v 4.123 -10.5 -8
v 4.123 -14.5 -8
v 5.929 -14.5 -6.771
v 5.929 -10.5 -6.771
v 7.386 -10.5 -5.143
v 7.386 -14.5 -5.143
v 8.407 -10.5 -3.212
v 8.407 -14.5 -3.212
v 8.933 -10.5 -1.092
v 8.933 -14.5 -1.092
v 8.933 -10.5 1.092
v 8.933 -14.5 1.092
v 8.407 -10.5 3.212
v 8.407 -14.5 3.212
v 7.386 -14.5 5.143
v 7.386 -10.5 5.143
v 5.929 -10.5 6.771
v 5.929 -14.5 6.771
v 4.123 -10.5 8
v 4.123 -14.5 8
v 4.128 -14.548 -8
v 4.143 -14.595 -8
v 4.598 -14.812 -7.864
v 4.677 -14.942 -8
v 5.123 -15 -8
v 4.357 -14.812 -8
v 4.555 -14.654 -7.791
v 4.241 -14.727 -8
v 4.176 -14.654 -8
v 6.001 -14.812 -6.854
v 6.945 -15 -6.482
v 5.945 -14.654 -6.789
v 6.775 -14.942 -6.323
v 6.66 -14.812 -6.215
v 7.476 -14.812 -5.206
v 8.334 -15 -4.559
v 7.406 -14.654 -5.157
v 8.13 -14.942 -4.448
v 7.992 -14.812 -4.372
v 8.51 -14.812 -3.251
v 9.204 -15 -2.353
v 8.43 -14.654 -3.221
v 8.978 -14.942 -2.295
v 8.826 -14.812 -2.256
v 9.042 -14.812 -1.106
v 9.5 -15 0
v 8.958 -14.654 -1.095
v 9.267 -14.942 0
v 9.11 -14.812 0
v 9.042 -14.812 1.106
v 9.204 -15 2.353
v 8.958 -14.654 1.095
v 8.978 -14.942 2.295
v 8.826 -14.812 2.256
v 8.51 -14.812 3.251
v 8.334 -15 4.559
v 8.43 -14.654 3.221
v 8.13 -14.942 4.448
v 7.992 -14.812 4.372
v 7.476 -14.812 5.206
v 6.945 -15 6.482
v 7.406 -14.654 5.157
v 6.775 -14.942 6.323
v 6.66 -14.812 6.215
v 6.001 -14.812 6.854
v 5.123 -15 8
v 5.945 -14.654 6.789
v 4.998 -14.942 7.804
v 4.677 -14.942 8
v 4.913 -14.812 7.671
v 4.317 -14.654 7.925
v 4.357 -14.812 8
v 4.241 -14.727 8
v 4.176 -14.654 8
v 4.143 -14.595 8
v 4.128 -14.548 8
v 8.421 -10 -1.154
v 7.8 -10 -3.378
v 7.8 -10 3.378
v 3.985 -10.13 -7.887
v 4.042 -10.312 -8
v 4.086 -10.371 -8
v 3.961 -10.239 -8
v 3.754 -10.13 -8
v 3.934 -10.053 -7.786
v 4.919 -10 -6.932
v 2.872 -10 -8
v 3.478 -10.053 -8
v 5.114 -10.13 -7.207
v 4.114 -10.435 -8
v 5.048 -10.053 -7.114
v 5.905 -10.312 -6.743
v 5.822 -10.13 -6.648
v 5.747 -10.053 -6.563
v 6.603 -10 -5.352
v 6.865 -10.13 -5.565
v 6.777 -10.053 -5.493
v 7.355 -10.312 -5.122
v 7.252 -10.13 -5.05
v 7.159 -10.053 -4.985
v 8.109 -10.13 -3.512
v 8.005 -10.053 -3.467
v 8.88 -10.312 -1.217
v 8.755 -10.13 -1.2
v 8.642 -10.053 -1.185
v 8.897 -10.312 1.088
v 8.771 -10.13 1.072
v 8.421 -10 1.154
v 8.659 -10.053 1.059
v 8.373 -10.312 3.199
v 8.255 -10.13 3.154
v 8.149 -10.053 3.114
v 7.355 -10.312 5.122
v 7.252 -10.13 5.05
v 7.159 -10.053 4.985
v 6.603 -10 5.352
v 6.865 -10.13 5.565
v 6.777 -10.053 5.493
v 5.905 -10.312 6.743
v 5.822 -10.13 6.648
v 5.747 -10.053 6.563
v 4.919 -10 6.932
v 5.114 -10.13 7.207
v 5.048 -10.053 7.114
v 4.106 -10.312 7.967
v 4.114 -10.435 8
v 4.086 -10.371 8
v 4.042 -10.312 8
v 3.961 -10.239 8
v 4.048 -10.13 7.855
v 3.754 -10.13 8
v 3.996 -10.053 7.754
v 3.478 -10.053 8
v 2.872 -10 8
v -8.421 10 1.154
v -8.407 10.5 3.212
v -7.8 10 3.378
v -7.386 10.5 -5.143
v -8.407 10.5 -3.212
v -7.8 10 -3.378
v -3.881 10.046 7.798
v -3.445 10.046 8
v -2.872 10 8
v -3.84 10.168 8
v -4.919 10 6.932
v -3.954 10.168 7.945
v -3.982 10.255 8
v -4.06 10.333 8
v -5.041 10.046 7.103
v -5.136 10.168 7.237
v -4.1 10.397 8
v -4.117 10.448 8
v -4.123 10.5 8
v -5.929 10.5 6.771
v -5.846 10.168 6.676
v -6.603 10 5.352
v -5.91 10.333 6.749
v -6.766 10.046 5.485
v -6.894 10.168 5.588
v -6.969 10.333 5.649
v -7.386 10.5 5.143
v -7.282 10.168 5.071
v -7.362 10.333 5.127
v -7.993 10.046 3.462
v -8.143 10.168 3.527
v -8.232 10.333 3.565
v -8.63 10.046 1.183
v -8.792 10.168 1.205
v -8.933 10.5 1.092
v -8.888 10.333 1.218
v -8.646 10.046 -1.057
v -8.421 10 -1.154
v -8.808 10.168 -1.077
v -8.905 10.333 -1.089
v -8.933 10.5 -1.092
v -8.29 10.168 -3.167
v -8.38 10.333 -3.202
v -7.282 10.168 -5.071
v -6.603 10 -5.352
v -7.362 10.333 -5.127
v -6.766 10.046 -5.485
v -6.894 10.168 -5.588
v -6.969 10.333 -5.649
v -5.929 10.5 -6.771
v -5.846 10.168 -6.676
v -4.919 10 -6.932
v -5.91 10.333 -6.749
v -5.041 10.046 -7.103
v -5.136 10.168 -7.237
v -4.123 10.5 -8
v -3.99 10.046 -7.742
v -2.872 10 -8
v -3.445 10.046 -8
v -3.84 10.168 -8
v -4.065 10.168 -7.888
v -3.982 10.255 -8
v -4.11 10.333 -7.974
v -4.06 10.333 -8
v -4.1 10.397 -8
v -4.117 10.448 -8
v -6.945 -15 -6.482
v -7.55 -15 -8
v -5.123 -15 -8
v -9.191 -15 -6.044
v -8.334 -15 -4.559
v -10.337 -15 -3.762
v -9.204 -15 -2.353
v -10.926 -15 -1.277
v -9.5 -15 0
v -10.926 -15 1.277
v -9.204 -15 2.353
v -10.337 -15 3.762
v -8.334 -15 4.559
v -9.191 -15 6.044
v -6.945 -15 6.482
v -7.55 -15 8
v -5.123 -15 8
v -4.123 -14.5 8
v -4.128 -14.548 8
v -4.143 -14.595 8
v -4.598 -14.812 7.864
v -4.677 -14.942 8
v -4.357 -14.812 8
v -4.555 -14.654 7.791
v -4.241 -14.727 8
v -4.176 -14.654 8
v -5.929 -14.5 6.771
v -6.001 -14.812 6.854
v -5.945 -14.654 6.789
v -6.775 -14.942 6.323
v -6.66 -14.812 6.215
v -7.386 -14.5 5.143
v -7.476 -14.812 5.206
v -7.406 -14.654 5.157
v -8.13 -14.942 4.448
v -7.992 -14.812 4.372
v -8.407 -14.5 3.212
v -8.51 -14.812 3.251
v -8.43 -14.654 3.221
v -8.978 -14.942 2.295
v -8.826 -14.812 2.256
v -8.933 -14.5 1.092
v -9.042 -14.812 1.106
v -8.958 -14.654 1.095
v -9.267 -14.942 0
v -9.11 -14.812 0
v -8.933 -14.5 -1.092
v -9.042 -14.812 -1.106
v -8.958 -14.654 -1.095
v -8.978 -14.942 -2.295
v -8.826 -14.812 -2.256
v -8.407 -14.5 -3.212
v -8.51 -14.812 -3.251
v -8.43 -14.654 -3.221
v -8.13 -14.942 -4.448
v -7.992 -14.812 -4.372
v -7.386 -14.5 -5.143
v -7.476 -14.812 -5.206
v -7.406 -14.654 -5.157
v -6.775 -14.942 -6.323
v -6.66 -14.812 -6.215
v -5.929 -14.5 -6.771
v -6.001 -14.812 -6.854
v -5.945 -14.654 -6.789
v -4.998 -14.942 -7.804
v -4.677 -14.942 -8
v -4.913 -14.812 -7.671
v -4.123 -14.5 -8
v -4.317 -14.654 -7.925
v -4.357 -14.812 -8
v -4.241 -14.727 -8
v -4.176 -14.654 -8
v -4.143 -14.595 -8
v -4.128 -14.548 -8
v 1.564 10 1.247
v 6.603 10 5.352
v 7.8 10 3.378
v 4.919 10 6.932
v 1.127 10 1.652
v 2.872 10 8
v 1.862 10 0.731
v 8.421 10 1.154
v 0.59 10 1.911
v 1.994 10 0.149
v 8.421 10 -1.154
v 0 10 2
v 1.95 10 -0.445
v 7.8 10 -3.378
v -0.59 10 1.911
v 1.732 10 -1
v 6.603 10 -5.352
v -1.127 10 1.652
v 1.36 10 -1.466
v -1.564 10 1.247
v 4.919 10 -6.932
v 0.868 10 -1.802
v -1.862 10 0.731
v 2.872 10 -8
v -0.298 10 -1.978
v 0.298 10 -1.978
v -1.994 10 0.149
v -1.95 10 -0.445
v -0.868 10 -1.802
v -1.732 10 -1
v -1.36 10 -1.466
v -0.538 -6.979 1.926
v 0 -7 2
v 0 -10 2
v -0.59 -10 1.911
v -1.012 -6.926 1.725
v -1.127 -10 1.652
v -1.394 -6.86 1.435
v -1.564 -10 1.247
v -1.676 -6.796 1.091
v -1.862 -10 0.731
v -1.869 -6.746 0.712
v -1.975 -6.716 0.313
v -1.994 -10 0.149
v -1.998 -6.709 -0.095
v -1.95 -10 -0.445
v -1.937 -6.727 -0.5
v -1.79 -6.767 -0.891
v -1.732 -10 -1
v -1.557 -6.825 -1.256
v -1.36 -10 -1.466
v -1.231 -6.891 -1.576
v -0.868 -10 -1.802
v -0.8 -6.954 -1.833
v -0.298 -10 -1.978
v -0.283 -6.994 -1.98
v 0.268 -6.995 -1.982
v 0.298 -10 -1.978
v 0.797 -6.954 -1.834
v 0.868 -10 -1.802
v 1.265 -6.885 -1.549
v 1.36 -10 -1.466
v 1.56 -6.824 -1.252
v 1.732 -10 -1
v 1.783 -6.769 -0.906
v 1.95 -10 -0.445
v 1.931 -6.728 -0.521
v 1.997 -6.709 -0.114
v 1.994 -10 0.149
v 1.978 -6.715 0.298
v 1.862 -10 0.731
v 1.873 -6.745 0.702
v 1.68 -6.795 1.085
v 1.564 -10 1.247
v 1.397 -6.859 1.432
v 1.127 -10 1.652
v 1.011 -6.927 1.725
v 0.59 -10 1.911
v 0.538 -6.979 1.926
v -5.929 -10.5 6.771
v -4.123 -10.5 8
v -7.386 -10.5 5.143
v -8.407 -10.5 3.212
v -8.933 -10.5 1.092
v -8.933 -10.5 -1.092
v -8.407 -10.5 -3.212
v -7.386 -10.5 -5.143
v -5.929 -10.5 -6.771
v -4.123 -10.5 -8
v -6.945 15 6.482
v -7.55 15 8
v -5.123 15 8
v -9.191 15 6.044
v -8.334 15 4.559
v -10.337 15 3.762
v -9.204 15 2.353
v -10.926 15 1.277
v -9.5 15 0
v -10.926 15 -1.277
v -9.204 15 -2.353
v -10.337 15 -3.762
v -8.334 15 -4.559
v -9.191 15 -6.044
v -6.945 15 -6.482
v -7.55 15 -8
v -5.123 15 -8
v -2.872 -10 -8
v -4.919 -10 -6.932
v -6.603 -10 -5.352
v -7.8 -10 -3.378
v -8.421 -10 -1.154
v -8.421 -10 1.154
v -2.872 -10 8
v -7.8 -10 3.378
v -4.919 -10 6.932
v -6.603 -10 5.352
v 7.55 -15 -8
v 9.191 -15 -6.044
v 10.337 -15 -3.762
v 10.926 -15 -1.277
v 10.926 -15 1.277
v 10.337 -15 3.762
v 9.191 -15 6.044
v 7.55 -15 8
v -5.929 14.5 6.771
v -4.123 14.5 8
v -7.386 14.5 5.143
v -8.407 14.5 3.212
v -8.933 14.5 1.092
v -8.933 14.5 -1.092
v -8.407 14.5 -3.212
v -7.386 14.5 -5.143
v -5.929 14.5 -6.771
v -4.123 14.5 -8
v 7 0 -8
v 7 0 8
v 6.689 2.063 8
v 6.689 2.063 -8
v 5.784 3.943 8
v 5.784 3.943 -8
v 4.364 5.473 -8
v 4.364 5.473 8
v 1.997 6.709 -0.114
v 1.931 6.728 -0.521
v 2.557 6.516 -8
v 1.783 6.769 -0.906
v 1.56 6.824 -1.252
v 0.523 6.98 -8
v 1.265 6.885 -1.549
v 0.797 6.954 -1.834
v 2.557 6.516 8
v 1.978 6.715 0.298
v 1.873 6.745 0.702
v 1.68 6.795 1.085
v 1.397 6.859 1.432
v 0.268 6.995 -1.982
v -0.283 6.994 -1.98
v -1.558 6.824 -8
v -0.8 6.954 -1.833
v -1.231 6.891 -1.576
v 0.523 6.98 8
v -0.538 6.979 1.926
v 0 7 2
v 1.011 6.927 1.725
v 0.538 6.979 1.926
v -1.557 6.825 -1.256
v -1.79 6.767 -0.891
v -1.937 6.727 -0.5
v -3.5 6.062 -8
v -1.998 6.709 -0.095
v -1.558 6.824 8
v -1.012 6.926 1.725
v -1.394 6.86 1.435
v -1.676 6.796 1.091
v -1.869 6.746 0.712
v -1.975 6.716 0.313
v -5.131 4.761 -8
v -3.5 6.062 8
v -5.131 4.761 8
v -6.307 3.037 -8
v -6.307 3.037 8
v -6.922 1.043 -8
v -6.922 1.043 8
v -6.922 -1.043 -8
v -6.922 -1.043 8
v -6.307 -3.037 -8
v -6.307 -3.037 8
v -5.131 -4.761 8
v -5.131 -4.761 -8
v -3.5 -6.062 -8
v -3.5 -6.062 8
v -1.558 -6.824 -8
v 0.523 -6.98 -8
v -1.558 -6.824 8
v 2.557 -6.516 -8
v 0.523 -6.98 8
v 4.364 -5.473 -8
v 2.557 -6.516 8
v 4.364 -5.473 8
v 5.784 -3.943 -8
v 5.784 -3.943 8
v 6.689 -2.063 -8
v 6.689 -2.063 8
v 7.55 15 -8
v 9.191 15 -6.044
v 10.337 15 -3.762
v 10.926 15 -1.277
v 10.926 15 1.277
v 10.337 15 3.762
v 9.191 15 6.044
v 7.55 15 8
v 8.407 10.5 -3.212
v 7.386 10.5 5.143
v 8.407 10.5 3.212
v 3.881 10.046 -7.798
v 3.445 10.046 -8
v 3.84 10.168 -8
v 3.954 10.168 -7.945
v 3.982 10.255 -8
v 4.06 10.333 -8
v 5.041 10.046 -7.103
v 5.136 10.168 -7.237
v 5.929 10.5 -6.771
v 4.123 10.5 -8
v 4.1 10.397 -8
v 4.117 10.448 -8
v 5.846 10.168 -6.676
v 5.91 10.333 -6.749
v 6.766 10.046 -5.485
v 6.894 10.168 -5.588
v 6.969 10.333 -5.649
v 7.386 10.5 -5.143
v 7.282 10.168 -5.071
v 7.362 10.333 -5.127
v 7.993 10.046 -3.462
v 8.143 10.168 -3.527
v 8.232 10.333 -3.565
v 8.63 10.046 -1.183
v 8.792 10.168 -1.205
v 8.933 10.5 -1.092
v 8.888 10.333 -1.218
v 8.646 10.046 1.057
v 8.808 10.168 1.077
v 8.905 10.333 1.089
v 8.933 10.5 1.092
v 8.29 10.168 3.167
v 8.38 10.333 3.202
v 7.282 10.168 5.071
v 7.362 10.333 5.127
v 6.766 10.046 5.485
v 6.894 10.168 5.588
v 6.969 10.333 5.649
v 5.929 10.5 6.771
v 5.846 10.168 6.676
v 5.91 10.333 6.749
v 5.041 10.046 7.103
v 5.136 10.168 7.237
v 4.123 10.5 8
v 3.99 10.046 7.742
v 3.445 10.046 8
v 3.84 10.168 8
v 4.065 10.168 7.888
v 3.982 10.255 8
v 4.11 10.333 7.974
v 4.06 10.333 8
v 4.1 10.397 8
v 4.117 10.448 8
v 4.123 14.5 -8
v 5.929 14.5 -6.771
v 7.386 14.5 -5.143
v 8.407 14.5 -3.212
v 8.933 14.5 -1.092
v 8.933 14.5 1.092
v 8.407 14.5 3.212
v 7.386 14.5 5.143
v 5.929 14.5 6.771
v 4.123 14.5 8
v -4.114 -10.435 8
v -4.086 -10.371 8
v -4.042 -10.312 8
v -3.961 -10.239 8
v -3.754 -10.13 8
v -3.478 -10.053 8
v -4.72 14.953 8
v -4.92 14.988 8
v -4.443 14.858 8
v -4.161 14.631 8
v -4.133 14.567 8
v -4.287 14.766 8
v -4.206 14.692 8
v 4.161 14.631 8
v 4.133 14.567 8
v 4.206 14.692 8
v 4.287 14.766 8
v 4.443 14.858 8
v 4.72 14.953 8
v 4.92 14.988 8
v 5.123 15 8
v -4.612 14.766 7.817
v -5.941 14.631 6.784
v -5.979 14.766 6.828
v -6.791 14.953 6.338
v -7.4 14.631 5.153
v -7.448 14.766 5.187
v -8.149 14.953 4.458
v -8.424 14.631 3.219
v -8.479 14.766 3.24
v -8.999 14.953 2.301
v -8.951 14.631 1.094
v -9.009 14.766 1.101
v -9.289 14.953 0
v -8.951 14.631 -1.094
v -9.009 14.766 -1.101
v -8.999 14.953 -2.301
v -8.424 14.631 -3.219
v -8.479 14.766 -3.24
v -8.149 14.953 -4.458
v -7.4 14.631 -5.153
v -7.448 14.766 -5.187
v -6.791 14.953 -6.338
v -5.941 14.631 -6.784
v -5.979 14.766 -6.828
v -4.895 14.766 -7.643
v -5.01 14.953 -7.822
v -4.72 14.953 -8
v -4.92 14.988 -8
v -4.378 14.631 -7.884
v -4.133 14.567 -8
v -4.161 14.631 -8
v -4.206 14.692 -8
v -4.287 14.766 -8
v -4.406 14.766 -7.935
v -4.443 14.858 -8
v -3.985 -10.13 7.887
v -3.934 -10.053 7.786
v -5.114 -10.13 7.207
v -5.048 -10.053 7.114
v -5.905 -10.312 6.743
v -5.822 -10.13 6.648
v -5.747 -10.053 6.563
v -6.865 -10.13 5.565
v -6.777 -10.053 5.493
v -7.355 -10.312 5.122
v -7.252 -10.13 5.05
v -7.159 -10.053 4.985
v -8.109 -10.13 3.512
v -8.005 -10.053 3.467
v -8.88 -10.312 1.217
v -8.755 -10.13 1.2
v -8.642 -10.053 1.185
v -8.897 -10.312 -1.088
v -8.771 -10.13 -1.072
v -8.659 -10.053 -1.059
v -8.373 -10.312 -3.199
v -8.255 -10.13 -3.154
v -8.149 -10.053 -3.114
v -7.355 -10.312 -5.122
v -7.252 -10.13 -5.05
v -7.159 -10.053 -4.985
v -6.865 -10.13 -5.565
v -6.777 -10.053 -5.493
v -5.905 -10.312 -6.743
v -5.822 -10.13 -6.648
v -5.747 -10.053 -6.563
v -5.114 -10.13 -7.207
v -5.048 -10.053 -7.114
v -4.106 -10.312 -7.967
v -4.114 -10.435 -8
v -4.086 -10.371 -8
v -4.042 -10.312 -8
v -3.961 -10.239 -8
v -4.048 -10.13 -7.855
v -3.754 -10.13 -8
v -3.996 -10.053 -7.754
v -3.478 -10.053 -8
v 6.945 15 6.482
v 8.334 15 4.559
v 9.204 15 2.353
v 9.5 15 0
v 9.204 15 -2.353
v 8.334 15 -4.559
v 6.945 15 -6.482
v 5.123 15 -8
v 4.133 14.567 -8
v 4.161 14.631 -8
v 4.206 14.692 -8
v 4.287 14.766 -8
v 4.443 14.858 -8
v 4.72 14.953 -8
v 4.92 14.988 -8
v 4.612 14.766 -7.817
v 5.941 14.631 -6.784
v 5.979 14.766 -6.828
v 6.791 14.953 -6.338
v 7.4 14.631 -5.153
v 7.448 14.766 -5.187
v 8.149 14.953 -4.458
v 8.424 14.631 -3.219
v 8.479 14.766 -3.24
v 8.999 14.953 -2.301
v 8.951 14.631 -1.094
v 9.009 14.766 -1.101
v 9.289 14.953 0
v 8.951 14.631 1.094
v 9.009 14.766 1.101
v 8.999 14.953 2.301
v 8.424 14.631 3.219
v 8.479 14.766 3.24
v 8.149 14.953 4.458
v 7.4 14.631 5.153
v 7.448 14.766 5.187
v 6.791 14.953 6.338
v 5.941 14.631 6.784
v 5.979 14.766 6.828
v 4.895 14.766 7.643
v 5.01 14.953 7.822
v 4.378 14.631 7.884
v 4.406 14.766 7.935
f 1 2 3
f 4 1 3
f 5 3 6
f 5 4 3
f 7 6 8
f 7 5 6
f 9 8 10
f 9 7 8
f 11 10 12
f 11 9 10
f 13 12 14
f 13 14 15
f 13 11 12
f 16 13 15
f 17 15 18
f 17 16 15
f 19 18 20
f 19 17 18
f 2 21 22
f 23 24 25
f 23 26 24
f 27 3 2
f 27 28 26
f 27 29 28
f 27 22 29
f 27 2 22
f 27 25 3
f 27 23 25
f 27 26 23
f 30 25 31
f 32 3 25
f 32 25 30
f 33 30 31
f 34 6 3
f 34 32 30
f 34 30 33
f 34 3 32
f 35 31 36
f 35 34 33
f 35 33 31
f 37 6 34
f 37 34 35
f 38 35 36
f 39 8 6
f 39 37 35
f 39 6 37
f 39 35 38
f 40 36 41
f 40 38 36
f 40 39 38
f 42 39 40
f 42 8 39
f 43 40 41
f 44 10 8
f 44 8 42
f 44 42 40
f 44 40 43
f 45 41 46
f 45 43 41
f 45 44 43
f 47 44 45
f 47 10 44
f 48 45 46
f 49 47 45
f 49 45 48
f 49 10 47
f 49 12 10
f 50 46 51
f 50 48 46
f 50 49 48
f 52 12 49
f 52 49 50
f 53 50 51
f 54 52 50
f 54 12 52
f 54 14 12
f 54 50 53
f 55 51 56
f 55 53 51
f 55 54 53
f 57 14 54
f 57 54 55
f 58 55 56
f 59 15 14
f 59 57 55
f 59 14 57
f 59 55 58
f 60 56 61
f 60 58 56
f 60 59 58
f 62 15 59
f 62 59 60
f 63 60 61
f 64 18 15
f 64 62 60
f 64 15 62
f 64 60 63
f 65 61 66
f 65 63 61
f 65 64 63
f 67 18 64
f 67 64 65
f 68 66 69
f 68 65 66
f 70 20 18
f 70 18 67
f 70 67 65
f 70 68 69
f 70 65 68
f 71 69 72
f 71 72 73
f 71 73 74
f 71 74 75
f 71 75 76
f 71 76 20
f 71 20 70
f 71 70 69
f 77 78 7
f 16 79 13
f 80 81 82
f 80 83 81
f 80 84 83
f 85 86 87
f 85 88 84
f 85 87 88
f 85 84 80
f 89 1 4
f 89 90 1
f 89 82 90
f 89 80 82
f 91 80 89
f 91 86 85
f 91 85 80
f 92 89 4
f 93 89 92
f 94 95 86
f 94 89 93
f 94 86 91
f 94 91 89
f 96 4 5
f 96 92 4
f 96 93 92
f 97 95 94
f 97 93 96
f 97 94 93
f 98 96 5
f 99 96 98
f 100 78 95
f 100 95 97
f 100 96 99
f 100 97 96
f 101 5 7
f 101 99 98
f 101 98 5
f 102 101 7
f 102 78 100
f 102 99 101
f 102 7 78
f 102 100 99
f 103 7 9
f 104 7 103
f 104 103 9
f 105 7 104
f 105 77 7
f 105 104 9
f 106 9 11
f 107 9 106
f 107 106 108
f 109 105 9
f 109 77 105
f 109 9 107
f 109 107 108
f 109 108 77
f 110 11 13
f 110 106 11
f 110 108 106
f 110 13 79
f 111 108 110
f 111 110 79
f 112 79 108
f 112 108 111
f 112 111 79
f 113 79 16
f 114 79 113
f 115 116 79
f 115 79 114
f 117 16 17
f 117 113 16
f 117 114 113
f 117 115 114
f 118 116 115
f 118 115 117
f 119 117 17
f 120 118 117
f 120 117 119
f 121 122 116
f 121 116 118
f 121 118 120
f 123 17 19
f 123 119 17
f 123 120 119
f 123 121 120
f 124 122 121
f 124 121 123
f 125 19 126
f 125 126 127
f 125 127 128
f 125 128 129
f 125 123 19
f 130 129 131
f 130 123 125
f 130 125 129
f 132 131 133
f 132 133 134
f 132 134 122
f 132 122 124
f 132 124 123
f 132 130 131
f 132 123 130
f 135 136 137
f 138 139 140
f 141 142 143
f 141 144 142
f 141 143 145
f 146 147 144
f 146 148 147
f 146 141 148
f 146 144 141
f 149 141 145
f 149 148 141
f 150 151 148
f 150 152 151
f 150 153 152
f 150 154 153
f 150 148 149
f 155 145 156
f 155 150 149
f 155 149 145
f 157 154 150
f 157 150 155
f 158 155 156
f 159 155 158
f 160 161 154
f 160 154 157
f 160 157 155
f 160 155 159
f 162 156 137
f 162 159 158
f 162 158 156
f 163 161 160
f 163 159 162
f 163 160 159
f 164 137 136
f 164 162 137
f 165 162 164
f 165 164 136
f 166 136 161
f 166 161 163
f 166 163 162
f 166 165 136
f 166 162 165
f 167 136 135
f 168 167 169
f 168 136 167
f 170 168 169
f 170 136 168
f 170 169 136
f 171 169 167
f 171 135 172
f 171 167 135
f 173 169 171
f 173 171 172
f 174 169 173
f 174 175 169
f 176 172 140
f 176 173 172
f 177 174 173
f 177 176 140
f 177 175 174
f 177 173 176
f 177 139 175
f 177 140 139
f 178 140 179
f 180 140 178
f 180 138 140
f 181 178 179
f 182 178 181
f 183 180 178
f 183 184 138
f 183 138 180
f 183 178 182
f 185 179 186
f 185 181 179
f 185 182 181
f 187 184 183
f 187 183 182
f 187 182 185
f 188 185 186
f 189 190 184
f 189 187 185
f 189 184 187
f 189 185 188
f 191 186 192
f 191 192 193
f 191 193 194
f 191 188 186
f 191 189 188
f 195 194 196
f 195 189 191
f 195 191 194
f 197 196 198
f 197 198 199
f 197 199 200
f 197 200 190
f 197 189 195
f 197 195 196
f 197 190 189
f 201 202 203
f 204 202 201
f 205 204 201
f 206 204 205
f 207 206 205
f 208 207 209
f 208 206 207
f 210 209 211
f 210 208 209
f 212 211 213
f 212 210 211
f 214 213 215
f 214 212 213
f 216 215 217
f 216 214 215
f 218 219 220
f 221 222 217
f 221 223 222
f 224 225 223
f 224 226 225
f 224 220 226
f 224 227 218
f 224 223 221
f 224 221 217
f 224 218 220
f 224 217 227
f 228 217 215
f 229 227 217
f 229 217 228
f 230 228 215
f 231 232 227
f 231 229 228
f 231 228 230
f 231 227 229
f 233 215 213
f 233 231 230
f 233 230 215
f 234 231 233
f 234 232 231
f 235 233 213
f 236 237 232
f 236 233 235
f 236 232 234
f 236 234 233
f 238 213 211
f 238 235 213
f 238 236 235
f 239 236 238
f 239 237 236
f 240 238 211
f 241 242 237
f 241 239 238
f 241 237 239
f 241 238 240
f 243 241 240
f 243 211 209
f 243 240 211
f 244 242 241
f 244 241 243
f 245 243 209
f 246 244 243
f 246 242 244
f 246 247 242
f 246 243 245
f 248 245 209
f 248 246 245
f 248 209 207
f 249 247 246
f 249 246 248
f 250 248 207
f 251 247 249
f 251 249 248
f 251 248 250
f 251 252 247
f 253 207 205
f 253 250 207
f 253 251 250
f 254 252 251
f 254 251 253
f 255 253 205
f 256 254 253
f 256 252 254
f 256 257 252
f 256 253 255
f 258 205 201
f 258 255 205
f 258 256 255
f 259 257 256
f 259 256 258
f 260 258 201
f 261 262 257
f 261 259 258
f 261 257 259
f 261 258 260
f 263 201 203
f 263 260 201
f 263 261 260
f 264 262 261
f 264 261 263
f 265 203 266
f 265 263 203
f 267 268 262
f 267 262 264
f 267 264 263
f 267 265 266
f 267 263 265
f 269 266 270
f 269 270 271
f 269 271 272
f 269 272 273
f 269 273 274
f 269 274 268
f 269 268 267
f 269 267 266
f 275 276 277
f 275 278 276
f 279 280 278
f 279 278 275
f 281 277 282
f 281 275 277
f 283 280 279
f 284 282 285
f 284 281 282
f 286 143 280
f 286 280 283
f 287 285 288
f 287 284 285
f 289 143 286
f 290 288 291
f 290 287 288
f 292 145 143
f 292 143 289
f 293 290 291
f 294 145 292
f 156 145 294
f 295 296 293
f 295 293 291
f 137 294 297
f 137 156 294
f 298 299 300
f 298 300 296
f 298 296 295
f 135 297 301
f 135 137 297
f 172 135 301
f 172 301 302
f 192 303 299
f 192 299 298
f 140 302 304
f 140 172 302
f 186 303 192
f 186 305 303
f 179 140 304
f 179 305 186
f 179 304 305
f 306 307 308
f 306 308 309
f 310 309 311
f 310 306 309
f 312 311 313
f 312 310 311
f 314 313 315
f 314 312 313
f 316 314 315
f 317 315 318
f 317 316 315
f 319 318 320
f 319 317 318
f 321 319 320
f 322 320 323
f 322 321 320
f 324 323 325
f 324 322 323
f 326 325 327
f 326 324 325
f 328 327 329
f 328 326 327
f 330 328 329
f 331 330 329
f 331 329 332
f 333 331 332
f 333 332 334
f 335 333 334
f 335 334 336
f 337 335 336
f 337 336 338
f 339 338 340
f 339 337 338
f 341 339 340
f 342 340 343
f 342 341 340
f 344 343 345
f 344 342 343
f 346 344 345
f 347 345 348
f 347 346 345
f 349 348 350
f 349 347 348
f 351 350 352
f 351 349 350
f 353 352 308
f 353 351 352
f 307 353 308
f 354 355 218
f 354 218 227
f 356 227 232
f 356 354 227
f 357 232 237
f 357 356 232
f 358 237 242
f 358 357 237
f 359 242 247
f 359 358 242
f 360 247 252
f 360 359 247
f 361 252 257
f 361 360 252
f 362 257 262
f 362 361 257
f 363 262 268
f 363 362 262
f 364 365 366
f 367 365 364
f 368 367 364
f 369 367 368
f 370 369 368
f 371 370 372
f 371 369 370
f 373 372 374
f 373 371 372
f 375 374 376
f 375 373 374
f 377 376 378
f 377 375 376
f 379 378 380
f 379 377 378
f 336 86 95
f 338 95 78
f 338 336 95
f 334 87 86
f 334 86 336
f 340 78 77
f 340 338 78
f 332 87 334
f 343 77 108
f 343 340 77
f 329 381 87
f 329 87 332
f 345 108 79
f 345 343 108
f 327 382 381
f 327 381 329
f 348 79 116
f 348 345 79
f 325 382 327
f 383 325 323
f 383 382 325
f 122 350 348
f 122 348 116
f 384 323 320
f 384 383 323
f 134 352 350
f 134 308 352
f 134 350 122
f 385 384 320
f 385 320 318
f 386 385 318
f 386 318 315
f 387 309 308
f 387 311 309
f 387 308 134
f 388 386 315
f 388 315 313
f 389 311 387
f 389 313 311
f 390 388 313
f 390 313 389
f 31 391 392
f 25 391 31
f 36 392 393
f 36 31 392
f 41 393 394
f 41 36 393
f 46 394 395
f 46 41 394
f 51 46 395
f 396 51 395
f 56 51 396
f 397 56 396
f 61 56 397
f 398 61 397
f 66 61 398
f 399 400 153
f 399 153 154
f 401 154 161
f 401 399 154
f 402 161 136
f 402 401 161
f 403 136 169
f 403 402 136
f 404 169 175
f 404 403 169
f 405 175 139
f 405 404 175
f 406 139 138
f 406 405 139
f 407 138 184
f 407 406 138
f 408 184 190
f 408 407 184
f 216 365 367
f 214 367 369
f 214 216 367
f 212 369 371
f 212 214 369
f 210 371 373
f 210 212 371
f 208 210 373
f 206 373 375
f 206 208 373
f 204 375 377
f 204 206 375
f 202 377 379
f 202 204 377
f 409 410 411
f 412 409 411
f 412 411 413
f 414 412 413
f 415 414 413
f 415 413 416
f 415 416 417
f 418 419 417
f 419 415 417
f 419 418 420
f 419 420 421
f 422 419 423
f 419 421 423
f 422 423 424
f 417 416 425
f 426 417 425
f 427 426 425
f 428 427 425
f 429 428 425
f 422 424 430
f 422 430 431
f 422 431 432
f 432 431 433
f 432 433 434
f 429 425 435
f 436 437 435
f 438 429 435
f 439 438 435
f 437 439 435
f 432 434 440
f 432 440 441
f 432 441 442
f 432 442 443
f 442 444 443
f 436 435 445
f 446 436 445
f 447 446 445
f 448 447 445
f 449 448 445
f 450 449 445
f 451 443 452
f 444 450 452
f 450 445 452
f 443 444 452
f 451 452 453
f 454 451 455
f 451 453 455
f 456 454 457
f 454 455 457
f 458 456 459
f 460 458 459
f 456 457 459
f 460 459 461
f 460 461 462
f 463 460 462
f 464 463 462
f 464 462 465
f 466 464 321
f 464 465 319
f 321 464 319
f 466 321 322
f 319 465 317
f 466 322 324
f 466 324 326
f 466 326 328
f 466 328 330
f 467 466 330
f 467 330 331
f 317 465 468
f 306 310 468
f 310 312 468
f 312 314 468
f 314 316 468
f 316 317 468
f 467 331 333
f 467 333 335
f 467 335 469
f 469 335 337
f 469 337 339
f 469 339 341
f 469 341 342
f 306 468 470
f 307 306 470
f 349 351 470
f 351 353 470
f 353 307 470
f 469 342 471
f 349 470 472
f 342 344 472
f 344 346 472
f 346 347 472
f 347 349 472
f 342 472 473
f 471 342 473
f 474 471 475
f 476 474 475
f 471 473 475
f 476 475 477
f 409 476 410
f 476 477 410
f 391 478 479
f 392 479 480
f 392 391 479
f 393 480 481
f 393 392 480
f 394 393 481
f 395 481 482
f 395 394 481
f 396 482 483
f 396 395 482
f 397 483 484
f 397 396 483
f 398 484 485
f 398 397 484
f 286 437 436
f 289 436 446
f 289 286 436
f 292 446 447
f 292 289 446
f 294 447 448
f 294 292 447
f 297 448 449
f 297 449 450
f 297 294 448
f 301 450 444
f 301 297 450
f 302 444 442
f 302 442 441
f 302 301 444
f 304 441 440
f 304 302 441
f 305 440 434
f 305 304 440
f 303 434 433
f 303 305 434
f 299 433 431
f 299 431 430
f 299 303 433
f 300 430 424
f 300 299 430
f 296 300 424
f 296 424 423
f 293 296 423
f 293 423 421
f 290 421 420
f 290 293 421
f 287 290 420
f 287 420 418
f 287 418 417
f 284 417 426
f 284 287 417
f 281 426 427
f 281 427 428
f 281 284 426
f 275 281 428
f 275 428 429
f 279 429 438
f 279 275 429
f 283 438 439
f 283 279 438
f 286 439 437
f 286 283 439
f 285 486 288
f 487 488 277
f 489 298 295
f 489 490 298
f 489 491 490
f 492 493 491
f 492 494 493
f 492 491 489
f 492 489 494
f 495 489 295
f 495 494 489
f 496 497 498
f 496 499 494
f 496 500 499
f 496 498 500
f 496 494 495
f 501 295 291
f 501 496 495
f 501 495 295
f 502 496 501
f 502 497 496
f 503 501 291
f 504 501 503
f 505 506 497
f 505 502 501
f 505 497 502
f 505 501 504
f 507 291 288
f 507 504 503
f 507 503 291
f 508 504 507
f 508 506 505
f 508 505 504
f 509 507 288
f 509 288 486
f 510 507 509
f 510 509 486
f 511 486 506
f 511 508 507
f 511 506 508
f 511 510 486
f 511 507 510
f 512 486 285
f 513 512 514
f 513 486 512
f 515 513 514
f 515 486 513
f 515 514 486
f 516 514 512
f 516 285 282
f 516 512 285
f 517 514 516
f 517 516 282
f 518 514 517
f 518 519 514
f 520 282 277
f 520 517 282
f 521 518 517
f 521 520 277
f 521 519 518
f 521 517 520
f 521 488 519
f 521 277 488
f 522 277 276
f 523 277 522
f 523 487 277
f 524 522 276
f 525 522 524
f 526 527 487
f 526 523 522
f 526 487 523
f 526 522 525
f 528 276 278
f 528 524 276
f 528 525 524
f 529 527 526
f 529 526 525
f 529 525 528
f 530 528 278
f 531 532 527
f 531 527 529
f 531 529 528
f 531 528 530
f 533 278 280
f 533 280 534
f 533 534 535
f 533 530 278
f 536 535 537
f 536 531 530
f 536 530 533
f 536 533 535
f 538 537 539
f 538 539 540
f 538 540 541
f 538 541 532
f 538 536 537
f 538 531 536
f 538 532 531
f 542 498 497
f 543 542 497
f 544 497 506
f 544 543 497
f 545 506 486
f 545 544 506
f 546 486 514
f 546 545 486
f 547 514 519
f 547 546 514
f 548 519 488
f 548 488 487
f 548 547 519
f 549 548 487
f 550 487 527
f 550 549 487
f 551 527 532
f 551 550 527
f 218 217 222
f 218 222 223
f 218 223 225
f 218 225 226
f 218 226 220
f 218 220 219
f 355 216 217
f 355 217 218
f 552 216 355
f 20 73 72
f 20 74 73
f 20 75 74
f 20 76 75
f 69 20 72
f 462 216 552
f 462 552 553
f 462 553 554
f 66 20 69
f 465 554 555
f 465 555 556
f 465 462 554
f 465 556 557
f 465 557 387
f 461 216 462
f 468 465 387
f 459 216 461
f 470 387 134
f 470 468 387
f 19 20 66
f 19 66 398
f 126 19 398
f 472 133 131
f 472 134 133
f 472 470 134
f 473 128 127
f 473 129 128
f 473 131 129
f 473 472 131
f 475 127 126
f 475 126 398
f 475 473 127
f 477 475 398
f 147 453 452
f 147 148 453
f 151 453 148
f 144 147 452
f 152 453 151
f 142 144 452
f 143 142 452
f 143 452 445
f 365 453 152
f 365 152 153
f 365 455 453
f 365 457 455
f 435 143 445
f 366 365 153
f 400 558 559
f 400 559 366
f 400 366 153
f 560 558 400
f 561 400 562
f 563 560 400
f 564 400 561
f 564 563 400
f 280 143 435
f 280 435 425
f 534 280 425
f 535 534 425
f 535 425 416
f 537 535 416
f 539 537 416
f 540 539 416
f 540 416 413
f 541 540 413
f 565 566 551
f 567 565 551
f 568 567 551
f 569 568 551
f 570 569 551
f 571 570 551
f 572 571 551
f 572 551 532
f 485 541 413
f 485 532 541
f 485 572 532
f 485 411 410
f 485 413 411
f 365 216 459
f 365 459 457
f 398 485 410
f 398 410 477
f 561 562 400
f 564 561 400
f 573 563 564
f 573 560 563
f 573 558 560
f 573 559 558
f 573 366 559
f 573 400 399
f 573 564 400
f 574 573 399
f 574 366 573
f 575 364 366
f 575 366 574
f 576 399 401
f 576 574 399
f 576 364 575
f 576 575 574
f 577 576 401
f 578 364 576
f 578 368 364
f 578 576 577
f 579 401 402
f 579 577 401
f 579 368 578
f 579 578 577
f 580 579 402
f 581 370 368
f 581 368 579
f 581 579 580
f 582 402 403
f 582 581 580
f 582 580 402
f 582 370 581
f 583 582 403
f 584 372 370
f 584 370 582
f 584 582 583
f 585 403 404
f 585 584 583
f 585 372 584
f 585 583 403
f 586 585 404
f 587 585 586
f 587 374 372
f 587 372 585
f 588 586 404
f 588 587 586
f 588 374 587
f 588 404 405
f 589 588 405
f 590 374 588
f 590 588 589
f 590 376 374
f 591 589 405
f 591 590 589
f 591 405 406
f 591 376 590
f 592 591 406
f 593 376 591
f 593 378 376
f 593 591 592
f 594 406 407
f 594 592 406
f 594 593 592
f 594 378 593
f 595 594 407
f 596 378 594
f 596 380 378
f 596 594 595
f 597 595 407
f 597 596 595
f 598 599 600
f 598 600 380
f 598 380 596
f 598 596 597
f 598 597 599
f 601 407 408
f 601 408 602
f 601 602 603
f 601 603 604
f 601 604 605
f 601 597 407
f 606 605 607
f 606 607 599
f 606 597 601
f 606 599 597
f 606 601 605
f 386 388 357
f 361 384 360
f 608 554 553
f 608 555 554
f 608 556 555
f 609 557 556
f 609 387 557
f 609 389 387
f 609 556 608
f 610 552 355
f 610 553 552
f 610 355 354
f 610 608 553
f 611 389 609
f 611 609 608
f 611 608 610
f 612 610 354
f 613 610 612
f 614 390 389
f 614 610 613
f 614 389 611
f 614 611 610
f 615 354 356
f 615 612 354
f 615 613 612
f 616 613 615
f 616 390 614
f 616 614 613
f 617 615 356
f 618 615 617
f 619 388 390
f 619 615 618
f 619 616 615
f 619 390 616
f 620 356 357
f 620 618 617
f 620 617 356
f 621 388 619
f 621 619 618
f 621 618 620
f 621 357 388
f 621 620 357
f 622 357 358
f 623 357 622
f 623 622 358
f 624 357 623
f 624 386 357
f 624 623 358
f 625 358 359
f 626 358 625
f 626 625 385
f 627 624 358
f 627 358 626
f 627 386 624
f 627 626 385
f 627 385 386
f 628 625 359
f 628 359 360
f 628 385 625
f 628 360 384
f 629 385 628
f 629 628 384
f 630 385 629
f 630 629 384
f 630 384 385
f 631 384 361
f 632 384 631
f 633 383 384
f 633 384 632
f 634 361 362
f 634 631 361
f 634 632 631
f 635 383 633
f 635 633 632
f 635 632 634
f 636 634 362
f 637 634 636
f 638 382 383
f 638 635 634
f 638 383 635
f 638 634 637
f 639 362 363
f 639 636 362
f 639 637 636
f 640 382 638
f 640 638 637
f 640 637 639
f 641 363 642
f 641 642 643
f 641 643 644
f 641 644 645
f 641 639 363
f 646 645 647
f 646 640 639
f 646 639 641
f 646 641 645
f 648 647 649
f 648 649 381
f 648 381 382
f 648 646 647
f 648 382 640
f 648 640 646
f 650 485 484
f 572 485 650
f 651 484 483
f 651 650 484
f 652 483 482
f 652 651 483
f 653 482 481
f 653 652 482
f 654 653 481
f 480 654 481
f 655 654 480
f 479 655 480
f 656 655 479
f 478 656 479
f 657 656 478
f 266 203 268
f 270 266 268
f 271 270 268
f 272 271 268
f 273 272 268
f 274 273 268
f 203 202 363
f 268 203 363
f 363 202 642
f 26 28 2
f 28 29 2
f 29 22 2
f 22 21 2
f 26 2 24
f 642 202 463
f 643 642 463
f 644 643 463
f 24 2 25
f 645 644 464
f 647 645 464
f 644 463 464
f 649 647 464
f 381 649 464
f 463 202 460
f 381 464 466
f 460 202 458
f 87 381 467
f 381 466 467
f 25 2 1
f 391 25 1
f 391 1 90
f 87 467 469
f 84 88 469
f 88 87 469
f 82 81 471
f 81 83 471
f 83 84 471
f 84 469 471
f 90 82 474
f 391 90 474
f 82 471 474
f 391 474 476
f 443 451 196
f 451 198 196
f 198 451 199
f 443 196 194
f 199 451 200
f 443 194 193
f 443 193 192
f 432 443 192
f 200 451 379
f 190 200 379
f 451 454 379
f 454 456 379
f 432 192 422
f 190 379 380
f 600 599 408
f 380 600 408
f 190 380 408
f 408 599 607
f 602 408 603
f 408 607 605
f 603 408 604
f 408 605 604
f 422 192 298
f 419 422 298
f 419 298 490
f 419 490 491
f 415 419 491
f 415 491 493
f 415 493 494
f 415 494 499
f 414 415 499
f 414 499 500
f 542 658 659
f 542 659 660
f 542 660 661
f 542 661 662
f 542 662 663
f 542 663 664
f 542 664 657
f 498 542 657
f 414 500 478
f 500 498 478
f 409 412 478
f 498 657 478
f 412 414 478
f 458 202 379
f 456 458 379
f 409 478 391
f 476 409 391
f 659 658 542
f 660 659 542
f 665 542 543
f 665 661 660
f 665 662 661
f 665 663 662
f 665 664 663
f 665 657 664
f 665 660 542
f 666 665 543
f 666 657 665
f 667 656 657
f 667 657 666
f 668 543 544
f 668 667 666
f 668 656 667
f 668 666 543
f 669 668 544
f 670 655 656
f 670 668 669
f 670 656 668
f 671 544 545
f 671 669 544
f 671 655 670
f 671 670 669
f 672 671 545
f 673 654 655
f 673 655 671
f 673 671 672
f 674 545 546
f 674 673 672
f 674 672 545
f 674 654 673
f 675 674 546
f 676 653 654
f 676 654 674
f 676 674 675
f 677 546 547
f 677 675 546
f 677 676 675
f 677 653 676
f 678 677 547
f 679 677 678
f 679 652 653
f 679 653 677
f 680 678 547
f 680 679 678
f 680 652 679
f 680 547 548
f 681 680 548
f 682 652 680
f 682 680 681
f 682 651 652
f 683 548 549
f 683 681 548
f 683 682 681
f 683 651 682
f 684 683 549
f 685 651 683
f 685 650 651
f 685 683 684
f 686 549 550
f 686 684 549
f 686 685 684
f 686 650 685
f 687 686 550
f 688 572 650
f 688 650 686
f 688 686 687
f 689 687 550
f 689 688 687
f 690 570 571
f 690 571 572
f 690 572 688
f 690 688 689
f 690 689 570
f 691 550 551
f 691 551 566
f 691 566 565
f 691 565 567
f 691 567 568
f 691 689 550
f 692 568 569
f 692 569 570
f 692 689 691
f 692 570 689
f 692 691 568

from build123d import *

# Parameters (mm, degrees)
ESQUISSE2_W             = 4
ESQUISSE2_H             = 32
ENL_V_MAT_EXTRU_1_DEPTH = 42.194659848
ESQUISSE3_R             = 7
ENL_V_MAT_EXTRU_2_DEPTH = 25.535688419


with BuildPart() as part:
    # Esquisse1 → Base-Révolution (revolve)
    with BuildSketch(Plane.XY, mode=Mode.PRIVATE) as base_r_volution_sk:
        with BuildLine():
            Line((-2, 10), (-8.5, 10))
            ThreePointArc((-8.5, 10), (-8.853553391, 10.146446609), (-9, 10.5))
            Line((-9, 10.5), (-9, 14.5))
            ThreePointArc((-9, 14.5), (-9.146446609, 14.853553391), (-9.5, 15))
            Line((-9.5, 15), (-11, 15))
            Line((-11, 15), (-11, -15))
            Line((-11, -15), (-9.5, -15))
            ThreePointArc((-9.5, -15), (-9.146446609, -14.853553391), (-9, -14.5))
            Line((-9, -14.5), (-9, -10.5))
            ThreePointArc((-9, -10.5), (-8.853553391, -10.146446609), (-8.5, -10))
            Line((-8.5, -10), (-2, -10))
            Line((-2, -10), (-2, 10))
        make_face()
    revolve(base_r_volution_sk.sketch.rotate(Axis((0, 0, 0), (0, -1, 0)), 270), axis=Axis((0, 0, 0), (0, -1, 0)))

    # Esquisse2 → Enlèv. mat.-Extru.1 (cut, through all)
    with BuildSketch(Plane(origin=(-15, 15, 0), x_dir=(0, 0, -1), z_dir=(0, -1, 0))):
        with Locations((10, 11.76635514)):
            Rectangle(ESQUISSE2_W, ESQUISSE2_H)
        with Locations((-10, 11.76635514)):
            Rectangle(ESQUISSE2_W, ESQUISSE2_H)
    extrude(amount=ENL_V_MAT_EXTRU_1_DEPTH, mode=Mode.SUBTRACT)

    # Esquisse3 → Enlèv. mat.-Extru.2 (cut, through all)
    with BuildSketch(Plane.XY.offset(8)):
        Circle(ESQUISSE3_R)
    extrude(amount=-ENL_V_MAT_EXTRU_2_DEPTH, mode=Mode.SUBTRACT)


solid = part.part
